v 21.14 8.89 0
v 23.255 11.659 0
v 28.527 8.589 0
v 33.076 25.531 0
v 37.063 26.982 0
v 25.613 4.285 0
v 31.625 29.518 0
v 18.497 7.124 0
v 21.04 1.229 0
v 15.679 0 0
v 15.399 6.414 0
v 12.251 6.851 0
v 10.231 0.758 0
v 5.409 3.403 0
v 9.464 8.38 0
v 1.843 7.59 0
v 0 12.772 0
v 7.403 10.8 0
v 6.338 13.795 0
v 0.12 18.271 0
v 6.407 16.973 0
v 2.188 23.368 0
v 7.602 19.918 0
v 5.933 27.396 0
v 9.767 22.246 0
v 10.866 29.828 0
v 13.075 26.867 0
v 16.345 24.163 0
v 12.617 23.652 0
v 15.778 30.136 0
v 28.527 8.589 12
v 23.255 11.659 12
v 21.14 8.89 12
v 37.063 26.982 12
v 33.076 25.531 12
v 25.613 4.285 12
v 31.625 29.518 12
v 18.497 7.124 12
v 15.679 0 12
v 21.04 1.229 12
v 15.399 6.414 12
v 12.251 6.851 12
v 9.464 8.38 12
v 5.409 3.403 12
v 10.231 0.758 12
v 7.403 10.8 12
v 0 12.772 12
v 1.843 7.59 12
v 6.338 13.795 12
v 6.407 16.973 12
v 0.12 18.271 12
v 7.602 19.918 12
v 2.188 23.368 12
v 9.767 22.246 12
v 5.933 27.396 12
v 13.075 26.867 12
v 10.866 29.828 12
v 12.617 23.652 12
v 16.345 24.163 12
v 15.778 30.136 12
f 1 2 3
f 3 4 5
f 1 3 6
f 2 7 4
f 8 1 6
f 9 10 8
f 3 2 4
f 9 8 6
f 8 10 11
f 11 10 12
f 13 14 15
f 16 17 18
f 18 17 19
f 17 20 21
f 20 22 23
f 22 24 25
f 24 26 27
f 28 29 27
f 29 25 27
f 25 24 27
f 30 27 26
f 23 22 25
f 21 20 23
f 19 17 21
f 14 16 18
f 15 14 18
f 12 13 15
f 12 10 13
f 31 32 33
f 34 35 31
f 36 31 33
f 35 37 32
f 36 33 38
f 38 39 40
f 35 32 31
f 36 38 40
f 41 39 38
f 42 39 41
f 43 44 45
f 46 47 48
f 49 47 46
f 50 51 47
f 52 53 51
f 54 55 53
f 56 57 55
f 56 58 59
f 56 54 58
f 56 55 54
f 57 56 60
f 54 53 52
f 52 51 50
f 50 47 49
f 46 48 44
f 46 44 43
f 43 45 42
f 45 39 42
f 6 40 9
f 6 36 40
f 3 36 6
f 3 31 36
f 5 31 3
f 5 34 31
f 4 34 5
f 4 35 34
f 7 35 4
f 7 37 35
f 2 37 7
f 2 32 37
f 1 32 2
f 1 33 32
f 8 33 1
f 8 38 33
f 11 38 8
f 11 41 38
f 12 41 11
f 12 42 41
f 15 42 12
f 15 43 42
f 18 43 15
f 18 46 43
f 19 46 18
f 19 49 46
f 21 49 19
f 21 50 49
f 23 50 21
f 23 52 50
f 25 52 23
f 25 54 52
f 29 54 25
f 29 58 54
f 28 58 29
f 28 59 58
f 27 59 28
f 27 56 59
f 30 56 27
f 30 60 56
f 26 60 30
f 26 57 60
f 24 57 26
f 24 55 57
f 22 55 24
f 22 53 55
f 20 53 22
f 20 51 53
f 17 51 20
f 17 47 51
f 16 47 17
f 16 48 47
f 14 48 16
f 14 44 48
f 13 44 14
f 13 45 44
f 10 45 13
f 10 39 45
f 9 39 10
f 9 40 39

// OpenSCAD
$fn = 32;

// ----------------------------------------------------------------------
// Eye lug: ring_tail, 12 mm thick
// ----------------------------------------------------------------------

// --- parameters (mm) ---
profile_height = 12;      // extrusion height
profile_points = 30;      // points of the closed outline

profile = [[13.075, 26.867], [15.778, 30.136], [10.866, 29.828], [5.933, 27.396], [2.188, 23.368], [0.12, 18.271], [0, 12.772], [1.843, 7.59], [5.409, 3.403], [10.231, 0.758], [15.679, 0], [21.04, 1.229], [25.613, 4.285], [28.527, 8.589], [37.063, 26.982], [33.076, 25.531], [31.625, 29.518], [23.255, 11.659], [21.14, 8.89], [18.497, 7.124], [15.399, 6.414], [12.251, 6.851], [9.464, 8.38], [7.403, 10.8], [6.338, 13.795], [6.407, 16.973], [7.602, 19.918], [9.767, 22.246], [12.617, 23.652], [16.345, 24.163]];  // single closed polygon, 30 points, counter clockwise

// --- the one profile operation ---
linear_extrude(height = profile_height) polygon(points = profile);
